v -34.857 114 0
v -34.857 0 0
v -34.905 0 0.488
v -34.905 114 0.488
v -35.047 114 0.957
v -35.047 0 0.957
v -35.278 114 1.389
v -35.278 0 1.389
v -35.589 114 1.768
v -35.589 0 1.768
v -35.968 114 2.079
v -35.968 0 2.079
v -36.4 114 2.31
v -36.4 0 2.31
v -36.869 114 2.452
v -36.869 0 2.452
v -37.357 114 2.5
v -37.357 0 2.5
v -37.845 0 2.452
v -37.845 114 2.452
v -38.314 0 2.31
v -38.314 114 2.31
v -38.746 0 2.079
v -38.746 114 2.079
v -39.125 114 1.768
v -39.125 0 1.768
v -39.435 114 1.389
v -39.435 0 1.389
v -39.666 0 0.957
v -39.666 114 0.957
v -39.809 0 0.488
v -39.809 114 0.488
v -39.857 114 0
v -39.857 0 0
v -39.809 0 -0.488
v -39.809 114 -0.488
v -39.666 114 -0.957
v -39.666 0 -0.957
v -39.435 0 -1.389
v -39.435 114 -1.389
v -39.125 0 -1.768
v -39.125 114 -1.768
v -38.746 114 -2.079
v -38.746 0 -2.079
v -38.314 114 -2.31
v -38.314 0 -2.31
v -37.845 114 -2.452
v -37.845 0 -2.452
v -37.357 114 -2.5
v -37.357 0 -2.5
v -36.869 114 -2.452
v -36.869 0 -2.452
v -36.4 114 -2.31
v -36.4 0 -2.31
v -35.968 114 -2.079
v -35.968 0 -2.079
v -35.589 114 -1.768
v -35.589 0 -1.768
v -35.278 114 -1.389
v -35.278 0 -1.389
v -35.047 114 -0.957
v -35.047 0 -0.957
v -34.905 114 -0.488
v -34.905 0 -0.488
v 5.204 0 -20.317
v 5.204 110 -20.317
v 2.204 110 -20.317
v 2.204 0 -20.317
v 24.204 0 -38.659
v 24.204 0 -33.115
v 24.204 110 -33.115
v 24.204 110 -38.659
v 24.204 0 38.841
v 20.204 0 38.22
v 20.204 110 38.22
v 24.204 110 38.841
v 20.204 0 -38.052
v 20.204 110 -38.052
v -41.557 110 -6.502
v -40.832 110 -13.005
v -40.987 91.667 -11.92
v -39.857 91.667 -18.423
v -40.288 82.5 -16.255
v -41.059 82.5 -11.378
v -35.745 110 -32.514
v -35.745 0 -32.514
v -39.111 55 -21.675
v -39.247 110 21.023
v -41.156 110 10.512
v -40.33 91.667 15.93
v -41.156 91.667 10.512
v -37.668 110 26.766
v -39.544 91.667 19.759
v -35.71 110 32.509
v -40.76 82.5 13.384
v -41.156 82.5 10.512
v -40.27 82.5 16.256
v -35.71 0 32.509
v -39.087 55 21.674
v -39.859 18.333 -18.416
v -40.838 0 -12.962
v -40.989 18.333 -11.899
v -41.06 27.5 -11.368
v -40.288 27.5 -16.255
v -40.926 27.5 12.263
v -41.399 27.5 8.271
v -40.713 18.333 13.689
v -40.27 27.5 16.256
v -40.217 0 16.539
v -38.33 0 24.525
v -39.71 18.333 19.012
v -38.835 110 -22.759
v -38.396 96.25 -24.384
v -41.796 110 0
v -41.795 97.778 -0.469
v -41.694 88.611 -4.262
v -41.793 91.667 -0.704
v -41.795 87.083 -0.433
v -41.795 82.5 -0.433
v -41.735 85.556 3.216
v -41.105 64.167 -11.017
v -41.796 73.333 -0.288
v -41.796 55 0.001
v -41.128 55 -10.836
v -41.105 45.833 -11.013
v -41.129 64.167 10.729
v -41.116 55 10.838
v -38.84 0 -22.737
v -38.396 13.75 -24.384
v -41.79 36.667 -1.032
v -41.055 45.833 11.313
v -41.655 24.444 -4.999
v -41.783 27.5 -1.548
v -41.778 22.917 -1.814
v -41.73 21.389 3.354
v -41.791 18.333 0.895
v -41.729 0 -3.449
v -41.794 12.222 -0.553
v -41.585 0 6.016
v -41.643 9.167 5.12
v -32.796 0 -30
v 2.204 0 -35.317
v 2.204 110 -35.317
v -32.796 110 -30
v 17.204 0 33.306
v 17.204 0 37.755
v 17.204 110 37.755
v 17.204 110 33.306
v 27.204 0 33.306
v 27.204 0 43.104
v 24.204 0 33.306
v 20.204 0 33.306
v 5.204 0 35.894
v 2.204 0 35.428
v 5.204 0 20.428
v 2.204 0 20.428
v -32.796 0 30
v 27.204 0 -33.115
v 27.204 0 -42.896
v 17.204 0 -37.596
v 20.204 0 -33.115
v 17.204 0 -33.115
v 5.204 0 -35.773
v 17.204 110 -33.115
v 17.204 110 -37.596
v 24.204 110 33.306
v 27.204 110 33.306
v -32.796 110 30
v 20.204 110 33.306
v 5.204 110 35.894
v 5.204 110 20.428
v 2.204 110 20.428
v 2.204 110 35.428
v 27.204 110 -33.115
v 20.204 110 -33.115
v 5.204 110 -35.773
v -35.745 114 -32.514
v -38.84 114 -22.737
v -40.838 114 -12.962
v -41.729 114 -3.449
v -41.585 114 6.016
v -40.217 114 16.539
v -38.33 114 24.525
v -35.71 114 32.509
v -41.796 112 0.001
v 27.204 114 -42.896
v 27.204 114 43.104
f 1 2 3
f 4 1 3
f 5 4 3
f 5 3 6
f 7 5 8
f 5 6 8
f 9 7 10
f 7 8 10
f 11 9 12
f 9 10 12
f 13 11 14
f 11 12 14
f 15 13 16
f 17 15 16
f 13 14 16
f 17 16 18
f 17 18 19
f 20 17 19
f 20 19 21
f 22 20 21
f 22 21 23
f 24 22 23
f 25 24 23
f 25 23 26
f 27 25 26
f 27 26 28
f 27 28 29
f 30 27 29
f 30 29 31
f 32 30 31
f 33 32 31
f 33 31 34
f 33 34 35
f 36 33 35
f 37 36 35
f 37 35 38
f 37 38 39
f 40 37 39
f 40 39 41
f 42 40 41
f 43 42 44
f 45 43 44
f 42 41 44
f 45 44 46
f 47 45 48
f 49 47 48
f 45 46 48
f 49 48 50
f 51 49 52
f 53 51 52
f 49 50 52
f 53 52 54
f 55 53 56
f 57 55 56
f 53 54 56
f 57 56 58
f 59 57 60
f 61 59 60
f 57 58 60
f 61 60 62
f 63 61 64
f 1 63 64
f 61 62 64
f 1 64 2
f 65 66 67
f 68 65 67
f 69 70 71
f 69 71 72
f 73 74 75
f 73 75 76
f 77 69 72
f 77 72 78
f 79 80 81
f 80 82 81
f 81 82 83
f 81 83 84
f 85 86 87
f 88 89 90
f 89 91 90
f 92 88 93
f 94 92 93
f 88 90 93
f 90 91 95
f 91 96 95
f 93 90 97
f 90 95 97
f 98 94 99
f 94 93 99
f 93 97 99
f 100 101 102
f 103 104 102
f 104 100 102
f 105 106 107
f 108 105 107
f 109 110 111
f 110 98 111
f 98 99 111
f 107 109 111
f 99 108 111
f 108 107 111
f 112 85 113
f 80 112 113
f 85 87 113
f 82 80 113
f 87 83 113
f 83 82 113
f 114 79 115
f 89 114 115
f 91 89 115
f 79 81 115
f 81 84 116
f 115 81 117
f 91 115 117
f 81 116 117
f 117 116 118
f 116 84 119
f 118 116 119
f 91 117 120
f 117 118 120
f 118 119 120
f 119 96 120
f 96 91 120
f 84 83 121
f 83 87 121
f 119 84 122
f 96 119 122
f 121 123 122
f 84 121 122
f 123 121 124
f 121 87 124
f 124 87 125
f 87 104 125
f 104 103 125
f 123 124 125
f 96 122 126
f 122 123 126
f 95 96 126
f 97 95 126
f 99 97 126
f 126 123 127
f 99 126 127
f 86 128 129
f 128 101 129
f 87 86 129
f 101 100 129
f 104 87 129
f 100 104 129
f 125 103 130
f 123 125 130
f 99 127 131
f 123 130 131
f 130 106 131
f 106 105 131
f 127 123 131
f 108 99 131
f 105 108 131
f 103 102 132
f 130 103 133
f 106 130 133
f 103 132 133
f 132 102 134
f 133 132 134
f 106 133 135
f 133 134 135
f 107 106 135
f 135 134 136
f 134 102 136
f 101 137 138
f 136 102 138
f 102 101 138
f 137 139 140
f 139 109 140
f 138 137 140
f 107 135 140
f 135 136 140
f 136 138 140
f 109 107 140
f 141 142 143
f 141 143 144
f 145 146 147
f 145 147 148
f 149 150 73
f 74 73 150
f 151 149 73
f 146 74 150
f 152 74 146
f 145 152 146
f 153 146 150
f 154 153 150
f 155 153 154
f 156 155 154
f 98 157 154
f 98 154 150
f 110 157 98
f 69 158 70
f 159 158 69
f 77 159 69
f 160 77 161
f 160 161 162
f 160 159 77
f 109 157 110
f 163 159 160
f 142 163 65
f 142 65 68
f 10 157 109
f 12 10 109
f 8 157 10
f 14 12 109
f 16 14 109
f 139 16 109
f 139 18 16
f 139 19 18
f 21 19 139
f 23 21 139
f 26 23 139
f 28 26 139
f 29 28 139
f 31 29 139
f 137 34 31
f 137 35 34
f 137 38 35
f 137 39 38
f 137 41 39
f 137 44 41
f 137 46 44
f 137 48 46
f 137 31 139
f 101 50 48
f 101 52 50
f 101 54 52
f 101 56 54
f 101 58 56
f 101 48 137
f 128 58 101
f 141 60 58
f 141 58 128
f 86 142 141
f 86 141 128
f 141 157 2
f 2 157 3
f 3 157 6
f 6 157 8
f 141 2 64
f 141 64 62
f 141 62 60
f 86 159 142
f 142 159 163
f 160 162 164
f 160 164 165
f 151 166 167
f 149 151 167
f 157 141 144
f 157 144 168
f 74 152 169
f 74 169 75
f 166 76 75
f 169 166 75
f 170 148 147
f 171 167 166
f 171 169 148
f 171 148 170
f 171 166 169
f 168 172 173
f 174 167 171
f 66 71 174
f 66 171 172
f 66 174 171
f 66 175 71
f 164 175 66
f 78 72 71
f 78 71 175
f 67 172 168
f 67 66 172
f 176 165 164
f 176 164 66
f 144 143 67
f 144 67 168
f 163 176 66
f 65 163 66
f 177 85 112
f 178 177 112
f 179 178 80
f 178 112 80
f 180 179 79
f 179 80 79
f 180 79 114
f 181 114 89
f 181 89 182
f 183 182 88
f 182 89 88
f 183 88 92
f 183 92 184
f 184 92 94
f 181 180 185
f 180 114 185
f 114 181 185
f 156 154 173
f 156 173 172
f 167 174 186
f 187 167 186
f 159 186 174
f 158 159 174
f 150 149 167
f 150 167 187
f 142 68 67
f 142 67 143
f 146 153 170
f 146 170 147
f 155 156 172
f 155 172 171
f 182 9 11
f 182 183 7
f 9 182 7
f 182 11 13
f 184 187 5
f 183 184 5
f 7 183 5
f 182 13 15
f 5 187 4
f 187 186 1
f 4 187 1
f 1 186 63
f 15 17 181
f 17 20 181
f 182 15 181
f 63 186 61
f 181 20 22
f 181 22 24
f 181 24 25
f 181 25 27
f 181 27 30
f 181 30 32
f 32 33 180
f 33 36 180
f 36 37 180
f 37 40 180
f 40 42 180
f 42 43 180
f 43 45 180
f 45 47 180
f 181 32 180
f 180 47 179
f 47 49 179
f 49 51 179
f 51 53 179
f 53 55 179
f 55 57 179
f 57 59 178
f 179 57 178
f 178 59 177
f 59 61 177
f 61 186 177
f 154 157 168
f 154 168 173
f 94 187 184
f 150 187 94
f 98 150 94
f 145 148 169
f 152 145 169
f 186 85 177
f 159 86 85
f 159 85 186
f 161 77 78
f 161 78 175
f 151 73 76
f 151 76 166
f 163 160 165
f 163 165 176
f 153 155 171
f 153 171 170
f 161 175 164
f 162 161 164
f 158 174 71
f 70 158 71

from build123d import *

# Parameters (mm, degrees)
SALIENTE_EXTRUIR11_DEPTH   = 110
SALIENTE_EXTRUIR12_DEPTH   = 4
CROQUIS7_R                 = 2.5
CORTAR_EXTRUIR2_DEPTH      = 1.0000001
CORTAR_EXTRUIR2_DEPTH_BACK = 115.0000001


with BuildPart() as part:
    # Croquis1 → Saliente-Extruir11 (new body)
    with BuildSketch(Plane(origin=(0, 0, 0), x_dir=(1, 0, 0), z_dir=(0, 1, 0))):
        with BuildLine():
            Line((27.20407189, 42.896490362), (27.20407189, 39.115188491))
            Line((27.20407189, 39.115188491), (27.20407189, 33.115188491))
            Line((27.20407189, 33.115188491), (24.20407189, 33.115188491))
            Line((24.20407189, 33.115188491), (24.20407189, 38.659429067))
            Line((24.20407189, 38.659429067), (20.20407189, 38.051749834))
            Line((20.20407189, 38.051749834), (20.20407189, 33.115188491))
            Line((20.20407189, 33.115188491), (17.20407189, 33.115188491))
            Line((17.20407189, 33.115188491), (17.20407189, 37.59599041))
            Line((17.20407189, 37.59599041), (5.20407189, 35.772952711))
            Line((5.20407189, 35.772952711), (5.20407189, 20.317193287))
            Line((5.20407189, 20.317193287), (2.20407189, 20.317193287))
            Line((2.20407189, 20.317193287), (2.20407189, 35.317193287))
            Line((2.20407189, 35.317193287), (-32.79592811, 30))
            Line((-32.79592811, 30), (-32.79592811, -30))
            Line((-32.79592811, -30), (2.20407189, -35.428420748))
            Line((2.20407189, -35.428420748), (2.20407189, -20.428420748))
            Line((2.20407189, -20.428420748), (5.20407189, -20.428420748))
            Line((5.20407189, -20.428420748), (5.20407189, -35.893713955))
            Line((5.20407189, -35.893713955), (17.20407189, -37.754886783))
            Line((17.20407189, -37.754886783), (17.20407189, -33.30586414))
            Line((17.20407189, -33.30586414), (20.20407189, -33.30586414))
            Line((20.20407189, -33.30586414), (20.20407189, -38.22017999))
            Line((20.20407189, -38.22017999), (24.20407189, -38.840570933))
            Line((24.20407189, -38.840570933), (24.20407189, -33.30586414))
            Line((24.20407189, -33.30586414), (27.20407189, -33.30586414))
            Line((27.20407189, -33.30586414), (27.20407189, -39.30586414))
            Line((27.20407189, -39.30586414), (27.20407189, -43.103509638))
            Line((27.20407189, -43.103509638), (-35.710171222, -32.509265277))
            add(Edge.make_bspline(
                [(-35.745382219, 32.513512597), (-47.864078296, -0.004370105), (-35.710171222, -32.509265277)],
                knots=[0, 0, 0, 1, 1, 1], degree=2))
            Line((-35.745382219, 32.513512597), (27.20407189, 42.896490362))
        make_face()
    extrude(amount=SALIENTE_EXTRUIR11_DEPTH)

    # Croquis6 → Saliente-Extruir12 (add)
    with BuildSketch(Plane(origin=(0, 110, 0), x_dir=(1, 0, 0), z_dir=(0, 1, 0))):
        with BuildLine():
            Line((-35.745382219, 32.513512597), (27.20407189, 42.896490362))
            Line((27.20407189, 42.896490362), (27.20407189, -43.103509638))
            Line((27.20407189, -43.103509638), (-35.710171222, -32.509265277))
            add(Edge.make_bspline(
                [(-35.745382219, 32.513512597), (-47.864078276, -0.004407917), (-35.710171222, -32.509265277)],
                knots=[0, 0, 0, 1, 1, 1], degree=2))
        make_face()
    extrude(amount=SALIENTE_EXTRUIR12_DEPTH)

    # Croquis7 → Cortar-Extruir2 (cut, two sides)
    with BuildSketch(Plane.XZ) as cortar_extruir2_sk:
        with Locations((-37.356797981, 0)):
            Circle(CROQUIS7_R)
    extrude(amount=CORTAR_EXTRUIR2_DEPTH, mode=Mode.SUBTRACT)
    extrude(cortar_extruir2_sk.sketch, amount=-CORTAR_EXTRUIR2_DEPTH_BACK, mode=Mode.SUBTRACT)


solid = part.part
